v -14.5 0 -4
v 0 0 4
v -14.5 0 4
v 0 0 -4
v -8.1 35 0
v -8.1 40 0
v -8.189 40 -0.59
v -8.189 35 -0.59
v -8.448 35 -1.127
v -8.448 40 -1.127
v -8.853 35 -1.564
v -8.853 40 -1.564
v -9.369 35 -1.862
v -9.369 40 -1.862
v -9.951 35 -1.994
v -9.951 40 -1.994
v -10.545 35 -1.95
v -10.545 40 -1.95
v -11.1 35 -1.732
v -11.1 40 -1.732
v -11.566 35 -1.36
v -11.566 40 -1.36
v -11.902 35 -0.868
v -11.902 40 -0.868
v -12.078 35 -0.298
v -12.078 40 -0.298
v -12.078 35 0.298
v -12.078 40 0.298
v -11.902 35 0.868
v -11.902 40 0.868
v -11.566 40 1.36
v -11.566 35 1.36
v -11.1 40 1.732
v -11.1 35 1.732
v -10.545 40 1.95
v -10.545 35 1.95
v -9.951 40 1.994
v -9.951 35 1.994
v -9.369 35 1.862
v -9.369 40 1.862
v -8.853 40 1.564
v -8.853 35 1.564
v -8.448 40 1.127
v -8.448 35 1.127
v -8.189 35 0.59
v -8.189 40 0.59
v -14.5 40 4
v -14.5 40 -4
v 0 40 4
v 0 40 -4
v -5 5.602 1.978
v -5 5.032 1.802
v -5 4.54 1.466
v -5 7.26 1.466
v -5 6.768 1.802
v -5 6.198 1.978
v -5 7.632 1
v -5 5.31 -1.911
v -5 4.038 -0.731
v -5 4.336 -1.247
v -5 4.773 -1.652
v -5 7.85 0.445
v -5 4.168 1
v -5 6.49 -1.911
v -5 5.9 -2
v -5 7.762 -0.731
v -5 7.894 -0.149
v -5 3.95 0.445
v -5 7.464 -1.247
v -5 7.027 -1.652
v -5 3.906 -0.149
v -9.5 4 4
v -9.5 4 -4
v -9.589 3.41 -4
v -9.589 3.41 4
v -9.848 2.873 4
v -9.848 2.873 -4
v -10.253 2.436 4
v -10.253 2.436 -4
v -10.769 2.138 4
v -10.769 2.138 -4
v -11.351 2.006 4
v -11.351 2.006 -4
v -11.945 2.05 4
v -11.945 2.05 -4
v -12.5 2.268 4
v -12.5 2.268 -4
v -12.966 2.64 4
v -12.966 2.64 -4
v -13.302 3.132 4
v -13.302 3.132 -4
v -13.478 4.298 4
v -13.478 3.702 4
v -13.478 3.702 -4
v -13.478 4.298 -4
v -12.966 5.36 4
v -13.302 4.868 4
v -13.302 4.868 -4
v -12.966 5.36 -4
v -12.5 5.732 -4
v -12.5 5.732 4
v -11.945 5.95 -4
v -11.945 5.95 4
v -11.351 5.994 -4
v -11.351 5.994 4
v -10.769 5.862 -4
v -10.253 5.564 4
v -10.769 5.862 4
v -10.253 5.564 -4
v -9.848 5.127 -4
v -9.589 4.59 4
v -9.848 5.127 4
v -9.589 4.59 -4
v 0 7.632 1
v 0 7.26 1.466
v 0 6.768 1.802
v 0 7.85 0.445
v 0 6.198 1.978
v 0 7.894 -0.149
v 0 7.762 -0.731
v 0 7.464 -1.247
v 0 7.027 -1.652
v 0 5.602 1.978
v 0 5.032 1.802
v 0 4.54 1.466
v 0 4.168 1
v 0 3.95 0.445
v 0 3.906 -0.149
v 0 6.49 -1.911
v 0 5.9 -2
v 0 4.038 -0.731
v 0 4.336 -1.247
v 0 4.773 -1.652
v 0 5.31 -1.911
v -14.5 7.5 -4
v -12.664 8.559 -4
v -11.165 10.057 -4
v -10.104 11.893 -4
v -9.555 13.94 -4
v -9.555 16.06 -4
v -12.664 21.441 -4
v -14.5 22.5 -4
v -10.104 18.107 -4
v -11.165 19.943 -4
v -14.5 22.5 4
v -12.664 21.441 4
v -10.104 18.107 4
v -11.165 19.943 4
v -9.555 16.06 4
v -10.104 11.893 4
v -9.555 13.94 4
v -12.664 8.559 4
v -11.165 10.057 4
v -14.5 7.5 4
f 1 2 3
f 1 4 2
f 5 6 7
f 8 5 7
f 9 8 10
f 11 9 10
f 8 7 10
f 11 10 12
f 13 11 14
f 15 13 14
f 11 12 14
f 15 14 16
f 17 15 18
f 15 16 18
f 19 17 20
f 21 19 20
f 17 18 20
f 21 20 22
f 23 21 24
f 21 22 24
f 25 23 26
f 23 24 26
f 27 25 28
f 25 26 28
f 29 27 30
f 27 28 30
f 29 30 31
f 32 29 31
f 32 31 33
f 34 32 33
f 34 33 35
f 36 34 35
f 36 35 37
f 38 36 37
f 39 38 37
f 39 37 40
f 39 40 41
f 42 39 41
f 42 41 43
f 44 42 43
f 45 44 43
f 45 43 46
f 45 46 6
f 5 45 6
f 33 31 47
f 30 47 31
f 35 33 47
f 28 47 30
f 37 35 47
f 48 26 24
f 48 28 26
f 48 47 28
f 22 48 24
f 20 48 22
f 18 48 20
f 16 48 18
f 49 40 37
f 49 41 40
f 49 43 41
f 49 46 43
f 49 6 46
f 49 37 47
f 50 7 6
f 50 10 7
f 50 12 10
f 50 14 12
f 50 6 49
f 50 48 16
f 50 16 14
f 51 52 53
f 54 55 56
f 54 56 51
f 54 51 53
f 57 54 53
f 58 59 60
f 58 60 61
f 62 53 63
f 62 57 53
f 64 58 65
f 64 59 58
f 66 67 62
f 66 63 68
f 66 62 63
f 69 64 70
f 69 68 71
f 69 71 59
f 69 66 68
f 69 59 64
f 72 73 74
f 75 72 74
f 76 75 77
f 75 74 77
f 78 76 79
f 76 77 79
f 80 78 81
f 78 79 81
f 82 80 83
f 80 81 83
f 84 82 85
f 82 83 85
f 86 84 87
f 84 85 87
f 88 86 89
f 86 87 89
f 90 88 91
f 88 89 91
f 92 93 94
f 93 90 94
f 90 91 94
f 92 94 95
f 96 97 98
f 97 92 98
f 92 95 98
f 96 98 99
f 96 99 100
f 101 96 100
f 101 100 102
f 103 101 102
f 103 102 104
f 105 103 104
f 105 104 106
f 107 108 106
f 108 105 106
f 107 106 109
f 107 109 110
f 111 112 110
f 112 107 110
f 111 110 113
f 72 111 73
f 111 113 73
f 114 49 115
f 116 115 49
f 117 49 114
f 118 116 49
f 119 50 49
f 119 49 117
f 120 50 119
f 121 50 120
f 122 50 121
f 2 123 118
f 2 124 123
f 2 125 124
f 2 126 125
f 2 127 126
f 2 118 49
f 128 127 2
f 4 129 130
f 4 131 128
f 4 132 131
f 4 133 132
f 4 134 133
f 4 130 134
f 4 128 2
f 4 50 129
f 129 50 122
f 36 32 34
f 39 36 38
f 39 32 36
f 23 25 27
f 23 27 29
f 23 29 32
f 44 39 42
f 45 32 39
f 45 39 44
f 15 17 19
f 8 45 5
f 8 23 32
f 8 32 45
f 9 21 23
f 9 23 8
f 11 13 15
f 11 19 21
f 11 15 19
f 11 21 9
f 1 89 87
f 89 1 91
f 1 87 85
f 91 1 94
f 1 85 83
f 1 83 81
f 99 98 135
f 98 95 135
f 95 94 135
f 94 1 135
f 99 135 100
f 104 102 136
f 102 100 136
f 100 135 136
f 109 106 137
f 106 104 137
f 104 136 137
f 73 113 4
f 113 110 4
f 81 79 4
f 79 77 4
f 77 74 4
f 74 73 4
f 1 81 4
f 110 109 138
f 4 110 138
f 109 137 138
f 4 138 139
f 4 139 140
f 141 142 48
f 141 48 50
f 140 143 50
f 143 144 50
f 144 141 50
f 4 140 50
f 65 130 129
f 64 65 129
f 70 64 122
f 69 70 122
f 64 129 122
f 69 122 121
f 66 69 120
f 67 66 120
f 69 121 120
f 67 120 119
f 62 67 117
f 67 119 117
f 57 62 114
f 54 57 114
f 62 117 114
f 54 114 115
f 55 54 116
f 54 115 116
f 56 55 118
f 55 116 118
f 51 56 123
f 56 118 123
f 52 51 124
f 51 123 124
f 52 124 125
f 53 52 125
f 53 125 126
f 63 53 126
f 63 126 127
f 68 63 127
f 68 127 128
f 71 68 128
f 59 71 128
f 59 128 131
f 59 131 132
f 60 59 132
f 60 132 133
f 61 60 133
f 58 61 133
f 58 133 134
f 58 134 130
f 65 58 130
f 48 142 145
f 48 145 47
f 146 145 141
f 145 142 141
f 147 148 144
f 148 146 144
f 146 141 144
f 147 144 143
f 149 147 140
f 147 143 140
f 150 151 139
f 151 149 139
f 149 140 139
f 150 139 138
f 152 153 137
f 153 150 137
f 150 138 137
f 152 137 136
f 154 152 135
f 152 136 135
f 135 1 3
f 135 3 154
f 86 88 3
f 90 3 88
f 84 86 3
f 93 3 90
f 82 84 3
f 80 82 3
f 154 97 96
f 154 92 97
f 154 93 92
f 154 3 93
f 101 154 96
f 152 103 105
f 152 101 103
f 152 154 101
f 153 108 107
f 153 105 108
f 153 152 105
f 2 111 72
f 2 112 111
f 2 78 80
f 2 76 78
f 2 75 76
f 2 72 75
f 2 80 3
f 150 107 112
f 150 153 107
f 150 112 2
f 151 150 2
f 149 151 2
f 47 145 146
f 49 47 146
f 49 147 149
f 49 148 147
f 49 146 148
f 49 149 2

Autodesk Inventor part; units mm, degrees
ref_plane "YZ Plane" through (0, 0, 0) normal (1, 0, 0) x (0, 1, 0)
ref_plane "XZ Plane" through (0, 0, 0) normal (0, 1, 0) x (-1, 0, 0)
ref_plane "XY Plane" through (0, 0, 0) normal (0, 0, 1) x (1, 0, 0)
sketch "Эскиз1" plane through (0, 0, 0) normal (0, 0, 1) x (1, 0, 0)
  line L0 (0, 0) -> (-14.5, 0)
  line L1 (-14.5, 0) -> (-14.5, 40)
  line L2 (-14.5, 40) -> (0, 40)
  line L3 (0, 40) -> (0, 0)
  circle A0 centre (-11.5, 4) radius 2
  arc A1 (-14.5, 7.5) -> (-14.5, 22.5) centre (-17.6022, 15) ccw
  dimension "d0" = 14.5
  dimension "d1" = 40
  dimension "d2" = 4
  dimension "d4" = 4
  dimension "d5" = 11.5
  dimension "d6" = 15
  dimension "d7" = 15
extrude "Выдавливание1" add sketch "Эскиз1" along normal mid plane 8 contours L0 L1 A1 L2 L3
sketch "Эскиз2" plane through (0, 0, 4) normal (1, 0, 0) x (0, 0, -1)
  circle A0 centre (4, 5.9) radius 2
  line L0 (4, 0) -> (4, 4.8588) construction
  line L1 (8, 0) -> (0, 0) projected
  dimension "d10" = 4
  dimension "d16" = 5.9
extrude "Выдавливание2" cut sketch "Эскиз2" against normal blind 5
sketch "Эскиз3" plane through (-14.5, 40, 4) normal (0, 1, 0) x (1, 0, 0)
  circle A0 centre (4.4, 4) radius 2
  line L0 (14.5, 4) -> (4.4, 4) construction
  line L1 (14.5, 8) -> (14.5, 0) projected
  dimension "d13" = 4
  dimension "d17" = 10.1
extrude "Выдавливание3" cut sketch "Эскиз3" against normal blind 5
properties part number "держатель шкива"
